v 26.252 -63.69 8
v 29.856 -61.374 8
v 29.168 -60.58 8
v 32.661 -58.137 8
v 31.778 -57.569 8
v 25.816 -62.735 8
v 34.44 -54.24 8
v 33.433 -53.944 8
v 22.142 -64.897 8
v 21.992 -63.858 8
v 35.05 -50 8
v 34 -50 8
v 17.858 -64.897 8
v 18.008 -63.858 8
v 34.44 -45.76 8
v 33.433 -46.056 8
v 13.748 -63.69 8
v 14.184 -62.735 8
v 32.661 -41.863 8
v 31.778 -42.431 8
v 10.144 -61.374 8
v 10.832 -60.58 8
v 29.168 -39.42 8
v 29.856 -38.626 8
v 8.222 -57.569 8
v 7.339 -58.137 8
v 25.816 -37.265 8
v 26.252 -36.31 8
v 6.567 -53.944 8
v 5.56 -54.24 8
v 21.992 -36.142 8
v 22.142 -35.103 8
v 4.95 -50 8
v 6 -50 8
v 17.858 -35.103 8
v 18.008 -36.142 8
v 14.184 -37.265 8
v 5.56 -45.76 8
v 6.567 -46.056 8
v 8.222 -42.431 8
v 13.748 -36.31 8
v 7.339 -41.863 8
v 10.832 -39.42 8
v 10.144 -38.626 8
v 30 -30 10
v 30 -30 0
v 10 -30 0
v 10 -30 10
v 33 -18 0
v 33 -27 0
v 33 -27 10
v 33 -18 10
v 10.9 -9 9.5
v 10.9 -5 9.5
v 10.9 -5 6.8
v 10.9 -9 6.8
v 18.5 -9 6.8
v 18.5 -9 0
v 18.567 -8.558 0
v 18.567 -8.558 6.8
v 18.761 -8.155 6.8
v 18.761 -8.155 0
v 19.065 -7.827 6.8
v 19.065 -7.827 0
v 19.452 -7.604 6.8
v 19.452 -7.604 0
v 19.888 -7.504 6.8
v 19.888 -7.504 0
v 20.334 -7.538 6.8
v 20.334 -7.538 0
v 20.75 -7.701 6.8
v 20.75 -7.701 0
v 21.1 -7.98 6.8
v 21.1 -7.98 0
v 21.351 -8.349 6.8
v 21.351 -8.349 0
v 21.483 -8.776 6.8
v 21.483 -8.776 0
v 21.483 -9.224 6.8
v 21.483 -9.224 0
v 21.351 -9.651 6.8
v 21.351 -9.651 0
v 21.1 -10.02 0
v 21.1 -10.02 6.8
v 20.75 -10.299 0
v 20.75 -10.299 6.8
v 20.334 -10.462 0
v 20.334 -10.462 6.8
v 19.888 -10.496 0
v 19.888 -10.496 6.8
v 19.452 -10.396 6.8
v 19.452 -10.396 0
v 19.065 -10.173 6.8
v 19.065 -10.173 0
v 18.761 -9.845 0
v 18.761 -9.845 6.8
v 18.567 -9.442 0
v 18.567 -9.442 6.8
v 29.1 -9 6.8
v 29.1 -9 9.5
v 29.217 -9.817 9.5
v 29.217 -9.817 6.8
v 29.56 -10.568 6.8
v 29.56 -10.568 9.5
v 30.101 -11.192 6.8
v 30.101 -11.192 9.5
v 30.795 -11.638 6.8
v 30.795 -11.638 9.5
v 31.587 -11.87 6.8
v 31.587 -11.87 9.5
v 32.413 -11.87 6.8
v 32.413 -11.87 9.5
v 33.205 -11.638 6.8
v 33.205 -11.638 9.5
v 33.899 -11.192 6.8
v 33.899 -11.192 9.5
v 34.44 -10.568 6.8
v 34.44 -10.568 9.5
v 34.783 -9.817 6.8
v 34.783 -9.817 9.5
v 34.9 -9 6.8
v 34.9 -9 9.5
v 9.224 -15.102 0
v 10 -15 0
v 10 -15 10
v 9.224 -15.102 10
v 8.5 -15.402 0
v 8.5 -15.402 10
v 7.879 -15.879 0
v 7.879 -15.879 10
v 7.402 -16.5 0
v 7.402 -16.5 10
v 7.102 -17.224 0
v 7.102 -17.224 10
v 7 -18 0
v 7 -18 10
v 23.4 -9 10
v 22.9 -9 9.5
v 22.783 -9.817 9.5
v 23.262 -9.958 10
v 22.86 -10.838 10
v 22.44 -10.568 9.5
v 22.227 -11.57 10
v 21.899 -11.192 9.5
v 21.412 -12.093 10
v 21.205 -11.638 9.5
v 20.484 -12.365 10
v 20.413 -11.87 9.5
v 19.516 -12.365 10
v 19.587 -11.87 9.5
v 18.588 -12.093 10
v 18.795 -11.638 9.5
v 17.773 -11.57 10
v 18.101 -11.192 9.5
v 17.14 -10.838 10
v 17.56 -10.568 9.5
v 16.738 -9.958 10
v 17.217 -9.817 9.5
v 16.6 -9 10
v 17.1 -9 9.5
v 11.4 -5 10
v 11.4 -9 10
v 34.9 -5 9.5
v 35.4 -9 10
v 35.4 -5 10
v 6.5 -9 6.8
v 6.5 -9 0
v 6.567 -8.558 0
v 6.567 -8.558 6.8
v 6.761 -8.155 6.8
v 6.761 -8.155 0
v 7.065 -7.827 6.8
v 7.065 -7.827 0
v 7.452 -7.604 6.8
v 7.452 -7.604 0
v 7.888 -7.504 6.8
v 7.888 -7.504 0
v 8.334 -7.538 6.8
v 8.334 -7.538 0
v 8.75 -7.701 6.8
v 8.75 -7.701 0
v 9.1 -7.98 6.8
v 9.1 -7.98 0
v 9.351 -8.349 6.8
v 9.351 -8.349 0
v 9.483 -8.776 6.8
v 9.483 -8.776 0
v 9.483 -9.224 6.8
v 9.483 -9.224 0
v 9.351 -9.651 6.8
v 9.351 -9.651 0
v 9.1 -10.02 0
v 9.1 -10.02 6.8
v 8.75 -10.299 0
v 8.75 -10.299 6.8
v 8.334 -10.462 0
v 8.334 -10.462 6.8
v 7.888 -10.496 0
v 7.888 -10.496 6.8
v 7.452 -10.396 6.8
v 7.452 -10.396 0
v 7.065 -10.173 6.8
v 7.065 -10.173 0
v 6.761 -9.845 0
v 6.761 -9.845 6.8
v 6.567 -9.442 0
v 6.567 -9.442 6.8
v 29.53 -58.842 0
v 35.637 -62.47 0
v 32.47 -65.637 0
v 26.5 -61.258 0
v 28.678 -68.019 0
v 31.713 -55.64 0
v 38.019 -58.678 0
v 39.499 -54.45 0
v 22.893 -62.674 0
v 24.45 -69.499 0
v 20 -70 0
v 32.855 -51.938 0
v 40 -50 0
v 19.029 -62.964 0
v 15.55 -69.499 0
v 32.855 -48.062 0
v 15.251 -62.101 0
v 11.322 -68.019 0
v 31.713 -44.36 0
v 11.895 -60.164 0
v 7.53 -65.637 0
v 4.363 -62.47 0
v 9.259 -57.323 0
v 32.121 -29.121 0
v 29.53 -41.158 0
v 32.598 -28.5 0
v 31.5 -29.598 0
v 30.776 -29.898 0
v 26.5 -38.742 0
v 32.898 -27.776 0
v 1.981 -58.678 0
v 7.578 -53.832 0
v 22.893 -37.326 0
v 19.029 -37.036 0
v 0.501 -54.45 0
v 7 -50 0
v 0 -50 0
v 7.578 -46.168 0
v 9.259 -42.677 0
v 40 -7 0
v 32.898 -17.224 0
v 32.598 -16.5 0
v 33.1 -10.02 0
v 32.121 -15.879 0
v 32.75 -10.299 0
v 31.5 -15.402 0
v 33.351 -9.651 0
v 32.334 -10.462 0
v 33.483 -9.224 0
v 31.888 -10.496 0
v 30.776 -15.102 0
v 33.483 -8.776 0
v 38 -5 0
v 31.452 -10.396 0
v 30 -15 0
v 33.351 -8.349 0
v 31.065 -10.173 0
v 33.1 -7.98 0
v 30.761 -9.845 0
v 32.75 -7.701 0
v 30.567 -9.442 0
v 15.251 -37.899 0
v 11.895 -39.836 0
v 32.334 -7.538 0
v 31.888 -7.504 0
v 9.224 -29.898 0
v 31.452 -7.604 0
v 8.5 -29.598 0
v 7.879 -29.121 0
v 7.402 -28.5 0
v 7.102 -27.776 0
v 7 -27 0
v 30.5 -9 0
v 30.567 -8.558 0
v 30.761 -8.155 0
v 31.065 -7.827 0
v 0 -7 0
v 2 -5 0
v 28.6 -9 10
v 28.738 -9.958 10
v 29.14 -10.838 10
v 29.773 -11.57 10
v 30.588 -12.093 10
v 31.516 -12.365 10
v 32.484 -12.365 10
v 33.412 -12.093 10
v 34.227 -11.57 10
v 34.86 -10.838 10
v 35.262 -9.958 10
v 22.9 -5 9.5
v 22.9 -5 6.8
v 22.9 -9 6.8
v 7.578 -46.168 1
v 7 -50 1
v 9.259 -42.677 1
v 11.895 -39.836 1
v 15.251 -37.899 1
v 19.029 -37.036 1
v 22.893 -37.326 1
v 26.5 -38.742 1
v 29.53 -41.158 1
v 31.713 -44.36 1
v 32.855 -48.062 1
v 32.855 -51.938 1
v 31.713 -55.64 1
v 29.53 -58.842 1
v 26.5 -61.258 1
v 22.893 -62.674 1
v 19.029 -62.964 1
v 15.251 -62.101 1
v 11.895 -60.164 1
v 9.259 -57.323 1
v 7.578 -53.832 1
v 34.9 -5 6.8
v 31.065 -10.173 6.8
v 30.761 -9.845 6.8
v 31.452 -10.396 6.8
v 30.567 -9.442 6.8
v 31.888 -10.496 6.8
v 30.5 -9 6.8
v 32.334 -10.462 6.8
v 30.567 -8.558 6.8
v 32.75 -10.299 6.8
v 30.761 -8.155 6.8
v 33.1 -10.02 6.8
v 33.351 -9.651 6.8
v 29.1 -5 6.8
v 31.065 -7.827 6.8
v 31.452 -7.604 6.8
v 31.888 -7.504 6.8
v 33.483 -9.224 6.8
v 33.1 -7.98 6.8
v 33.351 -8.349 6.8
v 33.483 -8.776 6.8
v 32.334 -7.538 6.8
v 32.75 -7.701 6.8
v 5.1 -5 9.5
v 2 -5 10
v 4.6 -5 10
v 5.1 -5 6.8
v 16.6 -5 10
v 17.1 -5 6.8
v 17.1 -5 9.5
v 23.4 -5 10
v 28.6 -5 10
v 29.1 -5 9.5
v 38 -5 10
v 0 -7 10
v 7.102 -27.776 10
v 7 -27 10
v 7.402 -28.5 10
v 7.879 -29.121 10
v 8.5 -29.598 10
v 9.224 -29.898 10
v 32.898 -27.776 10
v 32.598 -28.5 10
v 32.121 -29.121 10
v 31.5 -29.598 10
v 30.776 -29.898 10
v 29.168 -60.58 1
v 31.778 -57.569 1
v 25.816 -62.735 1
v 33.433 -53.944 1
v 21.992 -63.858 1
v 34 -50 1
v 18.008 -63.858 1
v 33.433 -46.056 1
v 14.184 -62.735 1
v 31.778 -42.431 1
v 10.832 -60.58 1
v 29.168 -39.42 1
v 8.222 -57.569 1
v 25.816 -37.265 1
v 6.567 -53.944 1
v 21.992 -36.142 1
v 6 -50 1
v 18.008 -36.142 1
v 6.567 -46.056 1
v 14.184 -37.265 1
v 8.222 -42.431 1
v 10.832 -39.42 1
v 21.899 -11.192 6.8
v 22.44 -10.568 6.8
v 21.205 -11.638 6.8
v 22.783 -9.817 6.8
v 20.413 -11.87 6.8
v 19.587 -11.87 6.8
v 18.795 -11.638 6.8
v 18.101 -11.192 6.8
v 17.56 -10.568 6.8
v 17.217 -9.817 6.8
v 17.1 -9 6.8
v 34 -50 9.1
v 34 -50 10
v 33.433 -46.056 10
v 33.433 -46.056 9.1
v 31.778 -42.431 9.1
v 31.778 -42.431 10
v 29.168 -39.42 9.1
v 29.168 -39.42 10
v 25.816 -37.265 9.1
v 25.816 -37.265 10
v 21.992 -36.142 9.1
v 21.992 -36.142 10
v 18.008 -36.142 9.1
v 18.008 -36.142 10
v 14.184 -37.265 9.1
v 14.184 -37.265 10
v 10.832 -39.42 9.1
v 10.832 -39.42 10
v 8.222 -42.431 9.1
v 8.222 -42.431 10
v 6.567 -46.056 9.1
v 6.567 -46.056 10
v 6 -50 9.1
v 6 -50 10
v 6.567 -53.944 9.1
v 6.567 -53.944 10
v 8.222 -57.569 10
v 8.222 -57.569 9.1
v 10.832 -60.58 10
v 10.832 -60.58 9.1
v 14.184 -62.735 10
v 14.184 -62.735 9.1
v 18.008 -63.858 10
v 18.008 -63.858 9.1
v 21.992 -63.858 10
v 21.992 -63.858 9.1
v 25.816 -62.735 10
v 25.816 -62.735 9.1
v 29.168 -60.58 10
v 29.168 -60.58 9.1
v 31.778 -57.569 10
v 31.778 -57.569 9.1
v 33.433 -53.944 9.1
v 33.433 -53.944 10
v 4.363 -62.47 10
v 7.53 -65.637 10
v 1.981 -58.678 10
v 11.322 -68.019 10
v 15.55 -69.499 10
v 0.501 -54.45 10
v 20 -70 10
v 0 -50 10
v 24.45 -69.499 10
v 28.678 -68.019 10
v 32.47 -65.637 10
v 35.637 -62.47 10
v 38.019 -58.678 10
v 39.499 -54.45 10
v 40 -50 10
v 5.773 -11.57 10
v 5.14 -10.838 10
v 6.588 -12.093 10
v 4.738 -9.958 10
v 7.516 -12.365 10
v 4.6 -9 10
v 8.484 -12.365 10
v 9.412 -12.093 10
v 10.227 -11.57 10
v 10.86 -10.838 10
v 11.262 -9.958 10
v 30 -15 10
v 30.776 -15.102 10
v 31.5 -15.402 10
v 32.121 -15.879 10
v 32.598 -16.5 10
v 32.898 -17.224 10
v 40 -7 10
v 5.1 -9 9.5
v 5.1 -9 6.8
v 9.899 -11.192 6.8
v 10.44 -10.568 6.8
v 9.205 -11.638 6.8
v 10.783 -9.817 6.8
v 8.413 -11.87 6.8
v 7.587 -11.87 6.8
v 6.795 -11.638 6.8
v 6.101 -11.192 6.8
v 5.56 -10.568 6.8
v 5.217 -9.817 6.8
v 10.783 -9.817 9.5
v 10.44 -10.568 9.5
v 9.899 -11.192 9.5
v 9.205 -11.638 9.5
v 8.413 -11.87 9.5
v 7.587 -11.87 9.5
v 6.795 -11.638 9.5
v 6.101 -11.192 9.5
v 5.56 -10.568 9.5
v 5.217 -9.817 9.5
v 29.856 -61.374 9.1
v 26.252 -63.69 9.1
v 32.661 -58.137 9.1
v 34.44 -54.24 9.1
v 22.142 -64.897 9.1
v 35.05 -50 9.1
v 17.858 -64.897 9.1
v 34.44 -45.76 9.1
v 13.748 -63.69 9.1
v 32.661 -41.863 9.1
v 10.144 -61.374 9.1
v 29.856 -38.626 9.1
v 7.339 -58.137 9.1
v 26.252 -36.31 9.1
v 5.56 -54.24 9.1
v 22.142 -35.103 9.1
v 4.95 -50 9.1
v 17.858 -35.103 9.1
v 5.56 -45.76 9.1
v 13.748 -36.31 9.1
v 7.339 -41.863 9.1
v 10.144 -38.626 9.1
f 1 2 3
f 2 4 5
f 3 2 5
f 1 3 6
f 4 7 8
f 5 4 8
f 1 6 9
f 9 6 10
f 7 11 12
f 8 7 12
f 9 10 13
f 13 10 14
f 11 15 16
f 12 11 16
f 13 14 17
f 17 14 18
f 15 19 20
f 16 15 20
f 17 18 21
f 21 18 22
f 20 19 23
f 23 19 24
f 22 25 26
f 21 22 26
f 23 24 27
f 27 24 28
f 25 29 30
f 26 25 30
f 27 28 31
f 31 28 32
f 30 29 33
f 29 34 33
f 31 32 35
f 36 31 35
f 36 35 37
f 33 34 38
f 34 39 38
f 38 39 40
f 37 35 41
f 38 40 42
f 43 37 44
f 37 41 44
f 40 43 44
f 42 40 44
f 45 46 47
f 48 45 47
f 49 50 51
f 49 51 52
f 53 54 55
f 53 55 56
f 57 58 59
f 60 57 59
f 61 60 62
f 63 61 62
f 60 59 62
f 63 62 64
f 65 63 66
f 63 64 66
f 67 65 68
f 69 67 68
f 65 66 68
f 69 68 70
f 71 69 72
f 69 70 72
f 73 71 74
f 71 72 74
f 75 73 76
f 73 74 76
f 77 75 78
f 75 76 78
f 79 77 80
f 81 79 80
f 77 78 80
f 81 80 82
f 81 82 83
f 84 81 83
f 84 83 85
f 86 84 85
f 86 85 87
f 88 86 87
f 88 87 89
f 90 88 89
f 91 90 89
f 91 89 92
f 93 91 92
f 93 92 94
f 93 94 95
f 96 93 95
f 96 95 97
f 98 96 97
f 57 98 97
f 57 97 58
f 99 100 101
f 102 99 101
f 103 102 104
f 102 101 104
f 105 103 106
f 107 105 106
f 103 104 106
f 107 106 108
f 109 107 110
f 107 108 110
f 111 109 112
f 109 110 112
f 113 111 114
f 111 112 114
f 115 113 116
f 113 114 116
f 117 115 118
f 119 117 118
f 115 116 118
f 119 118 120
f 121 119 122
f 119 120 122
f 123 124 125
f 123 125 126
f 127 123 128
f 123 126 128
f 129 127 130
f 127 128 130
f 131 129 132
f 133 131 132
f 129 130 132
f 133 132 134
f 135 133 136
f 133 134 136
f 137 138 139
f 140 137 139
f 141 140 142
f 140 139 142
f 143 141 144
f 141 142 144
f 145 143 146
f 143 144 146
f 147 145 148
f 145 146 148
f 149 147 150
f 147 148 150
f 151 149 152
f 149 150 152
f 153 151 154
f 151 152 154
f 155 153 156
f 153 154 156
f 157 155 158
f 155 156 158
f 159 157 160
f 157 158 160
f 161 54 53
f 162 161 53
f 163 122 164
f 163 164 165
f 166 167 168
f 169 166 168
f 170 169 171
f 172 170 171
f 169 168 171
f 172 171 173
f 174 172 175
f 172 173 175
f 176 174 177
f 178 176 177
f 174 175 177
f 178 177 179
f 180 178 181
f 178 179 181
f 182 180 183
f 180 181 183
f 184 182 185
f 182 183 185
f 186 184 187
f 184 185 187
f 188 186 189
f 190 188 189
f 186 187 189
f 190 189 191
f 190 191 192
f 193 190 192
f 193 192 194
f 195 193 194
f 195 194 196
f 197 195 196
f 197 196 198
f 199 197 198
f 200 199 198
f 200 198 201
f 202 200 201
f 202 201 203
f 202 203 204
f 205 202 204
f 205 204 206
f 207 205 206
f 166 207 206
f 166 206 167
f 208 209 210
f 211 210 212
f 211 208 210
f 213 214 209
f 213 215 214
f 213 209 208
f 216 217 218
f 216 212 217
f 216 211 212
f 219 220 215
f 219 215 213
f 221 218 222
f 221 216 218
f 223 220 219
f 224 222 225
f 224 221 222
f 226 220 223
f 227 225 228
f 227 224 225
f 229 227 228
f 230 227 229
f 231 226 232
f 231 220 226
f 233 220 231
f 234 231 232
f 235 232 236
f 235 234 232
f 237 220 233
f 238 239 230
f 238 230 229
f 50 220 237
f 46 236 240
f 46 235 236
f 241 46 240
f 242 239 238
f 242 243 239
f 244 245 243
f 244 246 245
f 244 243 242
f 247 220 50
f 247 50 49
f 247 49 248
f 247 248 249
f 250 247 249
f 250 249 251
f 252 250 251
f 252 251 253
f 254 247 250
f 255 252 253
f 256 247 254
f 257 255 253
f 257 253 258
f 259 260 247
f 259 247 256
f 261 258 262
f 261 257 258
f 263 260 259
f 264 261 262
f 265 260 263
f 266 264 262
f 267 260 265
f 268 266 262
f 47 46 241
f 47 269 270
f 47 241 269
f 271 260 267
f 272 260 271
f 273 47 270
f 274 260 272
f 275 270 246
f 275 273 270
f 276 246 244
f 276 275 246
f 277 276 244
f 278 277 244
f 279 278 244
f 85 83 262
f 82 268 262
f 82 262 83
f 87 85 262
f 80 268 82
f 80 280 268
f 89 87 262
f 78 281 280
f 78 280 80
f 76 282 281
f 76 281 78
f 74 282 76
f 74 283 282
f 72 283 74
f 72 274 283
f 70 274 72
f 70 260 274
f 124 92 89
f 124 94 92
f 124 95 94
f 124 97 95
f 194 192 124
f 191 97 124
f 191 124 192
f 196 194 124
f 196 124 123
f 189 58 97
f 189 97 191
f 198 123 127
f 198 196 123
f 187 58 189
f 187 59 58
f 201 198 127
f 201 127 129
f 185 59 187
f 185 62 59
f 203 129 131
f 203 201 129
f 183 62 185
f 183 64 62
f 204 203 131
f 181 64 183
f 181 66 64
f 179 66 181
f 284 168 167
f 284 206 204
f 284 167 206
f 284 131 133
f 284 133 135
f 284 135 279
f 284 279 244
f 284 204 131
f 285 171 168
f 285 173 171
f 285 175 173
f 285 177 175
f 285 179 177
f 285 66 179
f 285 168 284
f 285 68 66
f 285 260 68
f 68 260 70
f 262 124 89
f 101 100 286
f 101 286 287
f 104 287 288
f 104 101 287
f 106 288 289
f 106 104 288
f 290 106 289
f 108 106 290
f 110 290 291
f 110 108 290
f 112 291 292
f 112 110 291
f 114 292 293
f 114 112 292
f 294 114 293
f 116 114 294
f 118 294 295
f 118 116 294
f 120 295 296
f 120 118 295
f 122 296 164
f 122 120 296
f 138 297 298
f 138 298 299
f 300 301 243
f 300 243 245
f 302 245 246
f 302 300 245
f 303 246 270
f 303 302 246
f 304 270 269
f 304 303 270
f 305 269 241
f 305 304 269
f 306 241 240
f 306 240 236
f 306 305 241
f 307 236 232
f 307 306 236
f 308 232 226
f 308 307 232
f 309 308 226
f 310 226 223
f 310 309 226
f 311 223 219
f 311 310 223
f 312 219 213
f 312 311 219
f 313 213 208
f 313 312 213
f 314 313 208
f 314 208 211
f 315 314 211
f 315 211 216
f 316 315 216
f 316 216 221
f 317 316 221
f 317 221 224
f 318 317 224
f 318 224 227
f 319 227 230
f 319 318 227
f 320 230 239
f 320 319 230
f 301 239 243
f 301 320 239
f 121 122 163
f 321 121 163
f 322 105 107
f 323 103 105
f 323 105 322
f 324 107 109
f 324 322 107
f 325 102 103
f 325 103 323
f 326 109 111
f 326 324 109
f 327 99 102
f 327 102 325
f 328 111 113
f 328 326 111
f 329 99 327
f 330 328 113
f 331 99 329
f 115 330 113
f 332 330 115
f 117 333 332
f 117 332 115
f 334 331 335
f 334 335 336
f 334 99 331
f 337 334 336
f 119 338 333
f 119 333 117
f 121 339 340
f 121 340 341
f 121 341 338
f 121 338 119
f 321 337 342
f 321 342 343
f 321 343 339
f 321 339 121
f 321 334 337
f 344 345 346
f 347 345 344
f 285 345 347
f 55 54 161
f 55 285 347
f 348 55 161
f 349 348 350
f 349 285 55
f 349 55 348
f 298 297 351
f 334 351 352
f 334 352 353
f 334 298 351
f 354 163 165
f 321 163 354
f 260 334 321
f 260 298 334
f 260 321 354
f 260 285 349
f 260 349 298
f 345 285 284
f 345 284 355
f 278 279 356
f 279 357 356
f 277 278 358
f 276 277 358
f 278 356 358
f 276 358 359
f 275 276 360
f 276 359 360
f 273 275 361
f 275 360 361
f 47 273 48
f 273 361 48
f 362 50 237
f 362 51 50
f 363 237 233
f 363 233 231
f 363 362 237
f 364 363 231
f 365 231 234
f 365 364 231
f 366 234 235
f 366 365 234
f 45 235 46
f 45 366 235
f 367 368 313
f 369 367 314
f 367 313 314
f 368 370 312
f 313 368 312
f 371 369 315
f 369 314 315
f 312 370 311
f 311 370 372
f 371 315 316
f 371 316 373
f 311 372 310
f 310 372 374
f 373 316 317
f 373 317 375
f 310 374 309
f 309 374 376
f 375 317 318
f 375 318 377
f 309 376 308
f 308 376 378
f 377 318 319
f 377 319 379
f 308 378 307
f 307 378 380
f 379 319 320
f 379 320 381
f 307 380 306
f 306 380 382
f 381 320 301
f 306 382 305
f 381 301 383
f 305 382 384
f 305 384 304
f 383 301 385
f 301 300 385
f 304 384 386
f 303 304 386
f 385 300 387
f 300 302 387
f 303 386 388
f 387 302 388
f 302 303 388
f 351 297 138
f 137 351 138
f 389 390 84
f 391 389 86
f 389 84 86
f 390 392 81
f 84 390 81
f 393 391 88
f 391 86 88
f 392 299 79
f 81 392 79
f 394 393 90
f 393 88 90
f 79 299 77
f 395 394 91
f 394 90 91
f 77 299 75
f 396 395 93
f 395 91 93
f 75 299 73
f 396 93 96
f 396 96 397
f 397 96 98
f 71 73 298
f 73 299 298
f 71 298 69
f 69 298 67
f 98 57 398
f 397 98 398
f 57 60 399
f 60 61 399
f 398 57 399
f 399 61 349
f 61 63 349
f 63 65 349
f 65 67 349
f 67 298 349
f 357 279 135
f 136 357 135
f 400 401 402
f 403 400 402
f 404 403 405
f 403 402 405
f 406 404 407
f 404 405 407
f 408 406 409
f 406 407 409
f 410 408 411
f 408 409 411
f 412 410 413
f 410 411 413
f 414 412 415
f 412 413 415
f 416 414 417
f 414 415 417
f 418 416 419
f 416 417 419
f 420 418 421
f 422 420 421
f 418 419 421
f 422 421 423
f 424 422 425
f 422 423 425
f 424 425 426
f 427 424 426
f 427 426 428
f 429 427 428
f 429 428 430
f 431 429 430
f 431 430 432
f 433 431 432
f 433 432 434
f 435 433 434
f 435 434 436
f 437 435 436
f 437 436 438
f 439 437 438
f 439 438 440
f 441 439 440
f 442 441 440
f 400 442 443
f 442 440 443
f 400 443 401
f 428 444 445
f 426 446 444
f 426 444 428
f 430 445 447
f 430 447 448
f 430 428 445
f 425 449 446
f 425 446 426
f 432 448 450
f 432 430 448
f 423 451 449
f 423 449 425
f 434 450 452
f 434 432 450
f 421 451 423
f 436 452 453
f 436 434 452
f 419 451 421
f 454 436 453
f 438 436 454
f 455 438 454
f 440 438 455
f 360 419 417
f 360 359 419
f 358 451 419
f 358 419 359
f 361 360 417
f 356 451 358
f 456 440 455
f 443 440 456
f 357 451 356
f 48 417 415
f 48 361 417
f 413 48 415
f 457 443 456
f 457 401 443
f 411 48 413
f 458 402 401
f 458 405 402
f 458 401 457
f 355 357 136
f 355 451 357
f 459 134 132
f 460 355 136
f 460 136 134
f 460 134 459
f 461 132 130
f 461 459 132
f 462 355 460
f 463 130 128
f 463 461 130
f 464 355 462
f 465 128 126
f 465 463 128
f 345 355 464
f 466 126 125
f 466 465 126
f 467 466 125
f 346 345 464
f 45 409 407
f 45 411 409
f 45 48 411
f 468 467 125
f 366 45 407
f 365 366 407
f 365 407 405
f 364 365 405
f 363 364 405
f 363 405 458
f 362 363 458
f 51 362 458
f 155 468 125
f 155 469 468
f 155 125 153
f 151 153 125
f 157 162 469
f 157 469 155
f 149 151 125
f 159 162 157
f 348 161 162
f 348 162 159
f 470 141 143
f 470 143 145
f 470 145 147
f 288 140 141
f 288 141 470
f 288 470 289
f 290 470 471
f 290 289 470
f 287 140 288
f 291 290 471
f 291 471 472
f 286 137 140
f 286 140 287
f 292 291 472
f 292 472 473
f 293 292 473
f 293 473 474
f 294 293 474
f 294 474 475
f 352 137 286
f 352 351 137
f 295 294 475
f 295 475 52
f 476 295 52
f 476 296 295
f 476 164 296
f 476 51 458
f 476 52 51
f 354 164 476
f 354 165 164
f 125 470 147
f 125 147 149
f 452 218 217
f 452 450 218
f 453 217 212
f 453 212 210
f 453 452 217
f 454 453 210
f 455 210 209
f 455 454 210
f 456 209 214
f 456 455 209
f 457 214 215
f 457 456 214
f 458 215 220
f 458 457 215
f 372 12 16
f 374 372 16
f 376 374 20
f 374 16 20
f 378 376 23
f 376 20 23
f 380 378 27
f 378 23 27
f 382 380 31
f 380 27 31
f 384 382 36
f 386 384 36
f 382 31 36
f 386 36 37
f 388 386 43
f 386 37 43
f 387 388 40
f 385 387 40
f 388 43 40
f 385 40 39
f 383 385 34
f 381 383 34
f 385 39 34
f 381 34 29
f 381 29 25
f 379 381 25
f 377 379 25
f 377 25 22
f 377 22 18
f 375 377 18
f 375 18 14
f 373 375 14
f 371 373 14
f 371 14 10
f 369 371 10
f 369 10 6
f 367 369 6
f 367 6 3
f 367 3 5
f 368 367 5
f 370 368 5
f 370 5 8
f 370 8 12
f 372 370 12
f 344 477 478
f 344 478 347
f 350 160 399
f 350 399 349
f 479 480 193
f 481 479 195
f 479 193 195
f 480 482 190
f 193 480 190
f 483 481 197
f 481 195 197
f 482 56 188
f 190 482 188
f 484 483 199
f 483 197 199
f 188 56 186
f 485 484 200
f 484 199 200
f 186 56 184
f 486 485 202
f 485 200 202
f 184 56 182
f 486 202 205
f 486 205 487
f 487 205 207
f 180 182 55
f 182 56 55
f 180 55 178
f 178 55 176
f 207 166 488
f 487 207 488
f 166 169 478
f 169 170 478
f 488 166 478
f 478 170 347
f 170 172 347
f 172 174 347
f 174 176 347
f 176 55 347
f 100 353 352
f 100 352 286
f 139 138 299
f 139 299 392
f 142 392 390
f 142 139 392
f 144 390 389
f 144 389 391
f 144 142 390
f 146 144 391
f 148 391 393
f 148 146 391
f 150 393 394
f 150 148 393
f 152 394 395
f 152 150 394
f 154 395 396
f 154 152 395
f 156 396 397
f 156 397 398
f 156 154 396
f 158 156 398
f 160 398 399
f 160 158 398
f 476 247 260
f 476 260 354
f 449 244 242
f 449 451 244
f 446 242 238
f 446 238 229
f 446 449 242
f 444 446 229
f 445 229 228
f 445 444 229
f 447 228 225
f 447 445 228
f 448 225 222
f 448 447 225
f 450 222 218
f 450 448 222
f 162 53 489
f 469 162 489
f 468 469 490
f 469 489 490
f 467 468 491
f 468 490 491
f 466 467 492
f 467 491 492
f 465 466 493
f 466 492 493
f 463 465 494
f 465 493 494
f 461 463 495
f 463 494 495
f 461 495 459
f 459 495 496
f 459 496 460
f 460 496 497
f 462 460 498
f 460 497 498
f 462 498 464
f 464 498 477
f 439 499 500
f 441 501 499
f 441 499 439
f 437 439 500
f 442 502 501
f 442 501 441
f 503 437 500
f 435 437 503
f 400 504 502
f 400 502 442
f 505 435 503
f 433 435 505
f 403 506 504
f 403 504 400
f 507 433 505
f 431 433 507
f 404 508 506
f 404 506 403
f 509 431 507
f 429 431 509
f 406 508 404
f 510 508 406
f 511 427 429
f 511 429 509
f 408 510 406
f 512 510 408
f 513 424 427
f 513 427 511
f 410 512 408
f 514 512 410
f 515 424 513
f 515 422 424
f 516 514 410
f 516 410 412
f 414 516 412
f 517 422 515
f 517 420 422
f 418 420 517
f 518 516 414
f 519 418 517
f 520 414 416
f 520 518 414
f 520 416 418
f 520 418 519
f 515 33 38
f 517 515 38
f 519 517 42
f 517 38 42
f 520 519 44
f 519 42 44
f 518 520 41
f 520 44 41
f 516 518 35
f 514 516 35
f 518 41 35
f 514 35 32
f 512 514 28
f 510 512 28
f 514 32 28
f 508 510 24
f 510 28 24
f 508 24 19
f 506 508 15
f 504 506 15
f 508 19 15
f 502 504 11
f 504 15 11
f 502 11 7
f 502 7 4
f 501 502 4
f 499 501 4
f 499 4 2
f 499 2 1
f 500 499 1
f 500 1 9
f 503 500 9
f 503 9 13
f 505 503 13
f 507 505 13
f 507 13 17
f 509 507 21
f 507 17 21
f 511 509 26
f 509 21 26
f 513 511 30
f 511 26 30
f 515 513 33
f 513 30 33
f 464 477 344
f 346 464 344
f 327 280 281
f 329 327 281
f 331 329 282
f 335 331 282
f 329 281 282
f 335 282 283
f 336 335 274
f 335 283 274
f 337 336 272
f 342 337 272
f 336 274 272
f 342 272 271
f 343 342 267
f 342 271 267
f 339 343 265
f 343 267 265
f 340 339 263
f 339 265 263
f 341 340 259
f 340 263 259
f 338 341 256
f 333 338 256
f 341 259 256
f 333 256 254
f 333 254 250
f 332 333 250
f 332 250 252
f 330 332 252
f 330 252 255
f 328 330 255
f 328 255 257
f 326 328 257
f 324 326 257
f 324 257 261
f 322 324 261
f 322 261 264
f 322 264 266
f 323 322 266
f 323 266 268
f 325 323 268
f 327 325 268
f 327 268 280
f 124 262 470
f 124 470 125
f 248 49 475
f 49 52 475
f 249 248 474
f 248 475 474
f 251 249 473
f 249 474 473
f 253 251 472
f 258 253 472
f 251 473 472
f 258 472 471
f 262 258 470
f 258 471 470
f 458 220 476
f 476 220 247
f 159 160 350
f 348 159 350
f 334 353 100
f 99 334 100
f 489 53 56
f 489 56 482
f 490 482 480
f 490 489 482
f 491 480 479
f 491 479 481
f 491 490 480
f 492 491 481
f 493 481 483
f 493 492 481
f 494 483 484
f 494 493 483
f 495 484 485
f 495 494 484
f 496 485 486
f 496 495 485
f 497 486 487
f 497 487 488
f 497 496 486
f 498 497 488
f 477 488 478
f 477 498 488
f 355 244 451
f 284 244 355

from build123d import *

# Parameters (mm, degrees)
SKETCH_1_W          = 40
SKETCH_1_H          = 65
EXTRUDE_1_DEPTH     = 10
SKETCH_2_R          = 14
CUT_EXTRUDE_1_DEPTH = 12
SKETCH_3_R          = 15.05
CUT_EXTRUDE_2_DEPTH = 1.1
CHAMFER_1_SIZE      = 2
FILLET_1_R          = 20
SKETCH_4_R          = 1.5
CUT_EXTRUDE_3_DEPTH = 15
SKETCH_5_W          = 26
SKETCH_5_H          = 15
CUT_EXTRUDE_4_DEPTH = 15
FILLET_2_R          = 3
EXTRUDE_START       = -1
SKETCH_7_R          = 14
SKETCH_7_R_2        = 13
EXTRUDE_2_DEPTH     = 1
CUT_EXTRUDE_5_DEPTH = 3.2
CHAMFER_2_SIZE      = 0.5


with BuildPart() as part:
    # 草图1 → 凸台-拉伸1 (new body)
    with BuildSketch(Plane.XY):
        with Locations((20, -37.5)):
            Rectangle(SKETCH_1_W, SKETCH_1_H)
    extrude(amount=EXTRUDE_1_DEPTH)

    # 草图2 → 切除-拉伸1 (cut)
    with BuildSketch(Plane.XY.offset(10)):
        with Locations((20, -50)):
            Circle(SKETCH_2_R)
    extrude(amount=-CUT_EXTRUDE_1_DEPTH, mode=Mode.SUBTRACT)

    # 草图3 → 切除-拉伸2 (cut)
    with BuildSketch(Plane(origin=(0, 0, 8), x_dir=(-1, 0, 0), z_dir=(0, 0, -1))):
        with Locations((-20, -50)):
            Circle(SKETCH_3_R)
    extrude(amount=-CUT_EXTRUDE_2_DEPTH, mode=Mode.SUBTRACT)

    # 倒角1
    chamfer_1_edges = [part.edges().sort_by_distance(p)[0] for p in [
        (0, -5, 5),
        (40, -5, 5),
    ]]
    chamfer(chamfer_1_edges, length=CHAMFER_1_SIZE)

    # 圆角1
    fillet_1_edges = [part.edges().sort_by_distance(p)[0] for p in [
        (0, -70, 5),
        (40, -70, 5),
    ]]
    fillet(fillet_1_edges, radius=FILLET_1_R - 0.0001)  # a hair under: the kernel refuses the full size

    # 草图4 → 切除-拉伸3 (cut)
    with BuildSketch(Plane(origin=(0, 0, 0), x_dir=(-1, 0, 0), z_dir=(0, 0, -1))):
        with Locations((-32, -9)):
            Circle(SKETCH_4_R)
        with Locations((-20, -9)):
            Circle(SKETCH_4_R)
        with Locations((-8, -9)):
            Circle(SKETCH_4_R)
    extrude(amount=-CUT_EXTRUDE_3_DEPTH, mode=Mode.SUBTRACT)

    # 草图5 → 切除-拉伸4 (cut)
    with BuildSketch(Plane(origin=(0, 0, 0), x_dir=(-1, 0, 0), z_dir=(0, 0, -1))):
        with Locations((-20, -22.5)):
            Rectangle(SKETCH_5_W, SKETCH_5_H)
    extrude(amount=-CUT_EXTRUDE_4_DEPTH, mode=Mode.SUBTRACT)

    # 圆角2
    fillet_2_edges = [part.edges().sort_by_distance(p)[0] for p in [
        (7, -15, 5),
        (7, -30, 5),
        (33, -30, 5),
        (33, -15, 5),
    ]]
    fillet(fillet_2_edges, radius=FILLET_2_R)

    # 草图7 → 凸台-拉伸2 (add)
    with BuildSketch(Plane(origin=(0, 0, 0), x_dir=(-1, 0, 0), z_dir=(0, 0, -1)).offset(EXTRUDE_START)):
        with Locations((-20, -50)):
            Circle(SKETCH_7_R)
        with Locations((-20, -50)):
            Circle(SKETCH_7_R_2, mode=Mode.SUBTRACT)
    extrude(amount=EXTRUDE_2_DEPTH)

    # 草图8 → 切除-拉伸5 (cut)
    with BuildSketch(Plane.XY.offset(10)):
        with BuildLine():
            Line((5.1, -9), (5.1, -5))
            Line((5.1, -5), (10.9, -5))
            Line((10.9, -5), (10.9, -9))
            ThreePointArc((10.9, -9), (8, -11.9), (5.1, -9))
        make_face()
        with BuildLine():
            Line((17.1, -9), (17.1, -5))
            Line((17.1, -5), (22.9, -5))
            Line((22.9, -5), (22.9, -9))
            ThreePointArc((22.9, -9), (20, -11.9), (17.1, -9))
        make_face()
        with BuildLine():
            Line((34.9, -9), (34.9, -5))
            Line((34.9, -5), (29.1, -5))
            Line((29.1, -5), (29.1, -9))
            ThreePointArc((29.1, -9), (32, -11.9), (34.9, -9))
        make_face()
    extrude(amount=-CUT_EXTRUDE_5_DEPTH, mode=Mode.SUBTRACT)

    # 倒角2
    chamfer_2_edges = [part.edges().sort_by_distance(p)[0] for p in [
        (8, -11.9, 10),
        (10.9, -7, 10),
        (5.1, -7, 10),
        (32, -11.9, 10),
        (34.9, -7, 10),
        (29.1, -7, 10),
        (20, -11.9, 10),
        (22.9, -7, 10),
        (17.1, -7, 10),
    ]]
    chamfer(chamfer_2_edges, length=CHAMFER_2_SIZE)


solid = part.part
